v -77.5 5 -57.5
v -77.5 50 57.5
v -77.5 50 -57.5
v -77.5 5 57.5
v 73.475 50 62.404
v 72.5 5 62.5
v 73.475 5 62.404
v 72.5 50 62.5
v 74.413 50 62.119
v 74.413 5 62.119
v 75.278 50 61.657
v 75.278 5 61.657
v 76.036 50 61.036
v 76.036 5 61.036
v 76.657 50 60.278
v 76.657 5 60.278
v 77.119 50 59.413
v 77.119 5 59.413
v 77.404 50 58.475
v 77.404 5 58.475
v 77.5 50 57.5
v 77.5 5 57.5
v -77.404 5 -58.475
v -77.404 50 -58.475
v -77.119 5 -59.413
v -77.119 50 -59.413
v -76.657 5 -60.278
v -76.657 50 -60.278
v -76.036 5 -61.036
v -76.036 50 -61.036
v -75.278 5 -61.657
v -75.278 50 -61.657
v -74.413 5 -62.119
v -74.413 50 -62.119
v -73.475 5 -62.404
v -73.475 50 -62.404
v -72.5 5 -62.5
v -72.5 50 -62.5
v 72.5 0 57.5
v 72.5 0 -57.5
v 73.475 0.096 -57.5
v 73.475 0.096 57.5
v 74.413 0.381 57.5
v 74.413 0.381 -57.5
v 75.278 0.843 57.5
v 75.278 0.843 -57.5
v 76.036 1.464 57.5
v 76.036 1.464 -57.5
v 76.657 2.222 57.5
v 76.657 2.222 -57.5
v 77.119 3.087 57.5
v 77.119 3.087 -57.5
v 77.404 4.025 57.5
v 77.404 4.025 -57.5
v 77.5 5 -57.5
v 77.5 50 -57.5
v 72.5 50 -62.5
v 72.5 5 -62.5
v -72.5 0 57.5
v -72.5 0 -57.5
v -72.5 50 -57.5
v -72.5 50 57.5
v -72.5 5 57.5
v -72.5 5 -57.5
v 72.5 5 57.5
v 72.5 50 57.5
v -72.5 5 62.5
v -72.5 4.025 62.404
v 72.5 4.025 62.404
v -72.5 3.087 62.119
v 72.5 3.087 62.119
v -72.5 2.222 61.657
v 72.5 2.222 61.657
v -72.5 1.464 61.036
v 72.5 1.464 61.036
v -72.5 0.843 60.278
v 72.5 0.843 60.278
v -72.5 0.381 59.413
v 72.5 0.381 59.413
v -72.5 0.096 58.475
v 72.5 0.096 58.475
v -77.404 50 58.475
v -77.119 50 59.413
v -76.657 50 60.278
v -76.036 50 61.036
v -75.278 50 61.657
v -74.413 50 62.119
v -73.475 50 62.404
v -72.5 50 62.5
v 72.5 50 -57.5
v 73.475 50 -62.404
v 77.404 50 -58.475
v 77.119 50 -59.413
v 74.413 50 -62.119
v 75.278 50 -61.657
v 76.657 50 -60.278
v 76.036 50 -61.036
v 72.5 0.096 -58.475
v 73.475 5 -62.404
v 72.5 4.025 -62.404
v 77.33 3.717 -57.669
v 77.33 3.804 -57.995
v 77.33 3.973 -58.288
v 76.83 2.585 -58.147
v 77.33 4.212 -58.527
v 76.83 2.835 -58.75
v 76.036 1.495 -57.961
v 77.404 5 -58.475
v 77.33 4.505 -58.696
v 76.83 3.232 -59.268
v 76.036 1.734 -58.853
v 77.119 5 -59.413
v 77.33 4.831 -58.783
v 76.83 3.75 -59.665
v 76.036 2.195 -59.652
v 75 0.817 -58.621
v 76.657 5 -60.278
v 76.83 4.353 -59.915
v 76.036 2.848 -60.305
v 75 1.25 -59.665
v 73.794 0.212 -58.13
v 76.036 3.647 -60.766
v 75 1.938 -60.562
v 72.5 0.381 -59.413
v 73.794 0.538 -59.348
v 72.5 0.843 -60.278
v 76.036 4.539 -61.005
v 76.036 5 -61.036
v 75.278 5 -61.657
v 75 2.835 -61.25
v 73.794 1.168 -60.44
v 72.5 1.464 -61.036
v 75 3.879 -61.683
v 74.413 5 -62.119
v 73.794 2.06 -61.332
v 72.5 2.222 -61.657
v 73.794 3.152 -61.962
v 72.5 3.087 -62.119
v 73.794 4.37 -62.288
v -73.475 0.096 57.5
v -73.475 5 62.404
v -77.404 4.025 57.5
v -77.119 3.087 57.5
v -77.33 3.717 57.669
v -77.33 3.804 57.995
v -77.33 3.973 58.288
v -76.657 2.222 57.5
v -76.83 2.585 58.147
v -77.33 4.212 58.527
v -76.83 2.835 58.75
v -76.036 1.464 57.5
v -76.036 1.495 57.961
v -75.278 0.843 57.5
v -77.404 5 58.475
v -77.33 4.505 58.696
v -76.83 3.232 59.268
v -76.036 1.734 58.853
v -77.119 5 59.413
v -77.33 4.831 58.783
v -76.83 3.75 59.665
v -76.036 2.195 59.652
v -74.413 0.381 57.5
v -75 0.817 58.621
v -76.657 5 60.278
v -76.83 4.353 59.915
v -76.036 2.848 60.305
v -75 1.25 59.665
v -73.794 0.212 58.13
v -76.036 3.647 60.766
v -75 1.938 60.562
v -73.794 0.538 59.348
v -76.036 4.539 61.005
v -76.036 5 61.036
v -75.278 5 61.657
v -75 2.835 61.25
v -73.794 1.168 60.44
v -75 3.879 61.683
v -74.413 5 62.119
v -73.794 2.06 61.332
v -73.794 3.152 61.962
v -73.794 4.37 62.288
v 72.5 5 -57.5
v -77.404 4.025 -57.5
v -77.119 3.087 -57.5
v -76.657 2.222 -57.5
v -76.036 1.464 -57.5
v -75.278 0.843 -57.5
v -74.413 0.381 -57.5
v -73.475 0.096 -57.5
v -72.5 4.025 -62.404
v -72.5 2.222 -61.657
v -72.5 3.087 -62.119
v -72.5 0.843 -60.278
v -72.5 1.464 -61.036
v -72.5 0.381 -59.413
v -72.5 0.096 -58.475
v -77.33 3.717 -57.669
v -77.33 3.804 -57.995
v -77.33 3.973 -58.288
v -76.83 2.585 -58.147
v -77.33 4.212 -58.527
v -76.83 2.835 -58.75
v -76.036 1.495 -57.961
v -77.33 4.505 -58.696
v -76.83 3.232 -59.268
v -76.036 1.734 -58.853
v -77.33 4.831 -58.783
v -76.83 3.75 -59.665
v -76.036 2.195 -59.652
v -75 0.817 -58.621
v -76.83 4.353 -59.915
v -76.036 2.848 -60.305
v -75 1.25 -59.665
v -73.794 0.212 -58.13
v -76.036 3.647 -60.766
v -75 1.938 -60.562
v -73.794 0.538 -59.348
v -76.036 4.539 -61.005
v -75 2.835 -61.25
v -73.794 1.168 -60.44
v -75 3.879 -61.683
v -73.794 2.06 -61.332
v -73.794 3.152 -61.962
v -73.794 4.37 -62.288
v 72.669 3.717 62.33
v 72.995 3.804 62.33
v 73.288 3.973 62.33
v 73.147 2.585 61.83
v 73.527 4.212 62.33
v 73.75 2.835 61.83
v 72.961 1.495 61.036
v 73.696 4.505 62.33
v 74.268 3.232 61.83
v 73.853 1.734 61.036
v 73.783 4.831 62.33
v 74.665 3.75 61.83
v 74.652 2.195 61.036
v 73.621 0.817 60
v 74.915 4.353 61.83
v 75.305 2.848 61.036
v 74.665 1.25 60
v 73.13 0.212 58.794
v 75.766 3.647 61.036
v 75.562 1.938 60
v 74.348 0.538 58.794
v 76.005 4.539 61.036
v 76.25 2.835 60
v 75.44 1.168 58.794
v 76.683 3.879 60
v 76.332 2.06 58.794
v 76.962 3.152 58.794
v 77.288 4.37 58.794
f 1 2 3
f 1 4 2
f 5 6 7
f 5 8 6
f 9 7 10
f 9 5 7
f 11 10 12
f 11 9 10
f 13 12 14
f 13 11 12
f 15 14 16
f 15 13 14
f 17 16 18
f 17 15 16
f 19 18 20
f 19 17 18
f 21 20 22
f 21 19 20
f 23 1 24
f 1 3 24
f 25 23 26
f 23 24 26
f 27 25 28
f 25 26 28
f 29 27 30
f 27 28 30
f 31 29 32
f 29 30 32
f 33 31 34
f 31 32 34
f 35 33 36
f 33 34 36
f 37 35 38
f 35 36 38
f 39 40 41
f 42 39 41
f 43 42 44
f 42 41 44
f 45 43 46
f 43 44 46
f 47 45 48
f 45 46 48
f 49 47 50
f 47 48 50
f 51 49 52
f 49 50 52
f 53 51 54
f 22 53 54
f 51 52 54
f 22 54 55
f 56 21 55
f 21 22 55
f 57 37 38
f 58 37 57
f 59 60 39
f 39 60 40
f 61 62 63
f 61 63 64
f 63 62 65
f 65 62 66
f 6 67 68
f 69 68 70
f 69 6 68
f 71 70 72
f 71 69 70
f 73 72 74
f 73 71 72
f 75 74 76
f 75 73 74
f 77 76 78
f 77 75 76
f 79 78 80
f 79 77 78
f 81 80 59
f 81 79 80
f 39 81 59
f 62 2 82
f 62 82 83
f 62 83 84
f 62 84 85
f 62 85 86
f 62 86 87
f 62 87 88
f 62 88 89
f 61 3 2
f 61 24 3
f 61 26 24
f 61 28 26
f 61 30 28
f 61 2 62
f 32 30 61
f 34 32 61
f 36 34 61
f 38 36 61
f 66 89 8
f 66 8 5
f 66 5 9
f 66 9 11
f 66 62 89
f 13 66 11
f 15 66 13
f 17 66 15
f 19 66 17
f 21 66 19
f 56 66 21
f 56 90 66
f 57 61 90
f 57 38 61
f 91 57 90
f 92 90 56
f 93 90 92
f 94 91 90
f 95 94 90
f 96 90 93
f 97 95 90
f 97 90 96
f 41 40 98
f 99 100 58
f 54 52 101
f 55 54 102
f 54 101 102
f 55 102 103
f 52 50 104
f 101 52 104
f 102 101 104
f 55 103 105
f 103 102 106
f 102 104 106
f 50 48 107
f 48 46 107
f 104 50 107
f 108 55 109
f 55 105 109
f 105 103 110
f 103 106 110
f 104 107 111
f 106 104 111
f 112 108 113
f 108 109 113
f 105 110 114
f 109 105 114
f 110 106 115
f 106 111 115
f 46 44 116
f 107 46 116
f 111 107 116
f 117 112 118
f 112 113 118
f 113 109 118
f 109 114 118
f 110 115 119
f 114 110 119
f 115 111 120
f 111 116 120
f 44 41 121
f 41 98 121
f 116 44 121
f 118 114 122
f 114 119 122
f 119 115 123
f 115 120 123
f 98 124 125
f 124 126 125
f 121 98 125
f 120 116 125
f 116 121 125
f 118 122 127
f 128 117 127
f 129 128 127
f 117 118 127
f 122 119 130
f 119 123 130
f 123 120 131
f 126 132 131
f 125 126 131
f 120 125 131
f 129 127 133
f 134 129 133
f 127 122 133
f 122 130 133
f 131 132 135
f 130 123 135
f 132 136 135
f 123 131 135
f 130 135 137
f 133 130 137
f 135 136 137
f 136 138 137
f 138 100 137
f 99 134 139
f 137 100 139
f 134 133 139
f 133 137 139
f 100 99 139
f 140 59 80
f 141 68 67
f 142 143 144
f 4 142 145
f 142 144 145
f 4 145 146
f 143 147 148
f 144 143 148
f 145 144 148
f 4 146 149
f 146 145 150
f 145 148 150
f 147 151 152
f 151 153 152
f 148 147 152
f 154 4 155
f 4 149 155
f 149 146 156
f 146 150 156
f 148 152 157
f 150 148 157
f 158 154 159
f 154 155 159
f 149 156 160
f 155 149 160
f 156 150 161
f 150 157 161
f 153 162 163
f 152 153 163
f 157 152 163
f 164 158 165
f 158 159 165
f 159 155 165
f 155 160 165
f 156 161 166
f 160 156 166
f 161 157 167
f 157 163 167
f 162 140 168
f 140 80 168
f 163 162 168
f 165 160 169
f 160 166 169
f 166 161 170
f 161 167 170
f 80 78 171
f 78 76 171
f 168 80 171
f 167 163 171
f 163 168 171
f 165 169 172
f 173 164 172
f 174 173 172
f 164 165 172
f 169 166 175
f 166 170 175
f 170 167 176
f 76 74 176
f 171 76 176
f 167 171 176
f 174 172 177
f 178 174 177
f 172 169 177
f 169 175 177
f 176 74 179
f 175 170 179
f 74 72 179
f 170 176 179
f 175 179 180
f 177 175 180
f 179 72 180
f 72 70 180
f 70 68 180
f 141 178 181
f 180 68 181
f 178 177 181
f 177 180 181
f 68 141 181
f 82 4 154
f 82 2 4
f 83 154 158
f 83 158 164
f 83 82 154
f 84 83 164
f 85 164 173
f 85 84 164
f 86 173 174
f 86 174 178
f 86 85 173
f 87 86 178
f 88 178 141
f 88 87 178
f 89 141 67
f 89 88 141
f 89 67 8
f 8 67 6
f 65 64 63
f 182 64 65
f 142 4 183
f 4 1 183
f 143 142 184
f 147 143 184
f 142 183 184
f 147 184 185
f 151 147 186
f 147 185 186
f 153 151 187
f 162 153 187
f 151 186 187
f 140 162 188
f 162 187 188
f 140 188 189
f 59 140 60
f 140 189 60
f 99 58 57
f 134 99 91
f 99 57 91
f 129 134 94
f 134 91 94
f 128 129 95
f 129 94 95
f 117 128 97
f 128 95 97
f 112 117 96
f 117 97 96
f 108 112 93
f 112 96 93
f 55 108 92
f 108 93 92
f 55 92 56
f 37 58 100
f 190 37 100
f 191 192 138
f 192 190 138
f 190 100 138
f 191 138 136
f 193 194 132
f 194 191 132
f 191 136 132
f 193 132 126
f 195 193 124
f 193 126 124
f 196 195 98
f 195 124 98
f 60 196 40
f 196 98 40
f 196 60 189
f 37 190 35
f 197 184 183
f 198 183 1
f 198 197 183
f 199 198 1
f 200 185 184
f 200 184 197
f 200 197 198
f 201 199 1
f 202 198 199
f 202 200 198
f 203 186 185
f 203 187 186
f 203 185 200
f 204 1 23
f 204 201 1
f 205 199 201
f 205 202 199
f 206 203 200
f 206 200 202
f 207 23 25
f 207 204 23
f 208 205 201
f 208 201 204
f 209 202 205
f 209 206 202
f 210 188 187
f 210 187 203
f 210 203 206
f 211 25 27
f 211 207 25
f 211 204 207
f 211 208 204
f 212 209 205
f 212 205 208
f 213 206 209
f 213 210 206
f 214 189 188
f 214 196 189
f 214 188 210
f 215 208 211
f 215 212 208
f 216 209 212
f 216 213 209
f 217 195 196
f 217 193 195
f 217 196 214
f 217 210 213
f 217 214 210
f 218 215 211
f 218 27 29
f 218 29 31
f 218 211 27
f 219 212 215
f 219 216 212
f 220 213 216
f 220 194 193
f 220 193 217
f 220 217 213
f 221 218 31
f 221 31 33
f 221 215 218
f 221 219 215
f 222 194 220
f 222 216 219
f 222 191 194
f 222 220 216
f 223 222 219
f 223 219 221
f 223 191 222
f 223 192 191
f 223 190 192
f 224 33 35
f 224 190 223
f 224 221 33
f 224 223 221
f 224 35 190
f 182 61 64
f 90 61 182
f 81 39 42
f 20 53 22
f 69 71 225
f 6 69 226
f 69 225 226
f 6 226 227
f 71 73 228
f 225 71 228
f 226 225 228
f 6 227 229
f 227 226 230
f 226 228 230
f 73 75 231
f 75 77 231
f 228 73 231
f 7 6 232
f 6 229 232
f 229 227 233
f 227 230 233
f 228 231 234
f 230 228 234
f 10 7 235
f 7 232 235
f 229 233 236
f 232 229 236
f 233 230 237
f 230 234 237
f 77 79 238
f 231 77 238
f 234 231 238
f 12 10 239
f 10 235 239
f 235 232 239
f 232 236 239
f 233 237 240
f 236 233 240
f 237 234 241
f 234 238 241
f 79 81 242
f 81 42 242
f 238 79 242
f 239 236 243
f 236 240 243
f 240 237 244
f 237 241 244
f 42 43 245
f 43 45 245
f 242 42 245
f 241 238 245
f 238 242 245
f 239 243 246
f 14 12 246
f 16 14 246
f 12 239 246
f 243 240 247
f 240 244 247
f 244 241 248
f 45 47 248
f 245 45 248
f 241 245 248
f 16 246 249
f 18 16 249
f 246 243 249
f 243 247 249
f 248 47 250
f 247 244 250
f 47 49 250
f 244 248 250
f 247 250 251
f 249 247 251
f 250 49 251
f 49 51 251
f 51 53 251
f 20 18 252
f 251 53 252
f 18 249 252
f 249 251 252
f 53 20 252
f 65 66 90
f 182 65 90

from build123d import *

# Parameters (mm, degrees)
ESQUISSE3_W             = 155
ESQUISSE3_H             = 125
BOSS_EXTRU_1_DEPTH      = 50
ESQUISSE4_W             = 145
ESQUISSE4_H             = 115
ENL_V_MAT_EXTRU_1_DEPTH = 45
CONG_1_R                = 5


with BuildPart() as part:
    # Esquisse3 → Boss.-Extru.1 (new body)
    with BuildSketch(Plane(origin=(0, 0, 0), x_dir=(1, 0, 0), z_dir=(0, 1, 0))):
        Rectangle(ESQUISSE3_W, ESQUISSE3_H)
    extrude(amount=BOSS_EXTRU_1_DEPTH)

    # Esquisse4 → Enlèv. mat.-Extru.1 (cut)
    with BuildSketch(Plane(origin=(0, 50, 0), x_dir=(1, 0, 0), z_dir=(0, 1, 0))):
        Rectangle(ESQUISSE4_W, ESQUISSE4_H)
    extrude(amount=-ENL_V_MAT_EXTRU_1_DEPTH, mode=Mode.SUBTRACT)

    # Congé1
    cong_1_edges = [part.edges().sort_by_distance(p)[0] for p in [
        (0, 0, -62.5),
        (77.5, 0, 0),
        (0, 0, 62.5),
        (-77.5, 0, 0),
        (-77.5, 25, -62.5),
        (77.5, 25, -62.5),
        (77.5, 25, 62.5),
        (-77.5, 25, 62.5),
    ]]
    fillet(cong_1_edges, radius=CONG_1_R)


solid = part.part
